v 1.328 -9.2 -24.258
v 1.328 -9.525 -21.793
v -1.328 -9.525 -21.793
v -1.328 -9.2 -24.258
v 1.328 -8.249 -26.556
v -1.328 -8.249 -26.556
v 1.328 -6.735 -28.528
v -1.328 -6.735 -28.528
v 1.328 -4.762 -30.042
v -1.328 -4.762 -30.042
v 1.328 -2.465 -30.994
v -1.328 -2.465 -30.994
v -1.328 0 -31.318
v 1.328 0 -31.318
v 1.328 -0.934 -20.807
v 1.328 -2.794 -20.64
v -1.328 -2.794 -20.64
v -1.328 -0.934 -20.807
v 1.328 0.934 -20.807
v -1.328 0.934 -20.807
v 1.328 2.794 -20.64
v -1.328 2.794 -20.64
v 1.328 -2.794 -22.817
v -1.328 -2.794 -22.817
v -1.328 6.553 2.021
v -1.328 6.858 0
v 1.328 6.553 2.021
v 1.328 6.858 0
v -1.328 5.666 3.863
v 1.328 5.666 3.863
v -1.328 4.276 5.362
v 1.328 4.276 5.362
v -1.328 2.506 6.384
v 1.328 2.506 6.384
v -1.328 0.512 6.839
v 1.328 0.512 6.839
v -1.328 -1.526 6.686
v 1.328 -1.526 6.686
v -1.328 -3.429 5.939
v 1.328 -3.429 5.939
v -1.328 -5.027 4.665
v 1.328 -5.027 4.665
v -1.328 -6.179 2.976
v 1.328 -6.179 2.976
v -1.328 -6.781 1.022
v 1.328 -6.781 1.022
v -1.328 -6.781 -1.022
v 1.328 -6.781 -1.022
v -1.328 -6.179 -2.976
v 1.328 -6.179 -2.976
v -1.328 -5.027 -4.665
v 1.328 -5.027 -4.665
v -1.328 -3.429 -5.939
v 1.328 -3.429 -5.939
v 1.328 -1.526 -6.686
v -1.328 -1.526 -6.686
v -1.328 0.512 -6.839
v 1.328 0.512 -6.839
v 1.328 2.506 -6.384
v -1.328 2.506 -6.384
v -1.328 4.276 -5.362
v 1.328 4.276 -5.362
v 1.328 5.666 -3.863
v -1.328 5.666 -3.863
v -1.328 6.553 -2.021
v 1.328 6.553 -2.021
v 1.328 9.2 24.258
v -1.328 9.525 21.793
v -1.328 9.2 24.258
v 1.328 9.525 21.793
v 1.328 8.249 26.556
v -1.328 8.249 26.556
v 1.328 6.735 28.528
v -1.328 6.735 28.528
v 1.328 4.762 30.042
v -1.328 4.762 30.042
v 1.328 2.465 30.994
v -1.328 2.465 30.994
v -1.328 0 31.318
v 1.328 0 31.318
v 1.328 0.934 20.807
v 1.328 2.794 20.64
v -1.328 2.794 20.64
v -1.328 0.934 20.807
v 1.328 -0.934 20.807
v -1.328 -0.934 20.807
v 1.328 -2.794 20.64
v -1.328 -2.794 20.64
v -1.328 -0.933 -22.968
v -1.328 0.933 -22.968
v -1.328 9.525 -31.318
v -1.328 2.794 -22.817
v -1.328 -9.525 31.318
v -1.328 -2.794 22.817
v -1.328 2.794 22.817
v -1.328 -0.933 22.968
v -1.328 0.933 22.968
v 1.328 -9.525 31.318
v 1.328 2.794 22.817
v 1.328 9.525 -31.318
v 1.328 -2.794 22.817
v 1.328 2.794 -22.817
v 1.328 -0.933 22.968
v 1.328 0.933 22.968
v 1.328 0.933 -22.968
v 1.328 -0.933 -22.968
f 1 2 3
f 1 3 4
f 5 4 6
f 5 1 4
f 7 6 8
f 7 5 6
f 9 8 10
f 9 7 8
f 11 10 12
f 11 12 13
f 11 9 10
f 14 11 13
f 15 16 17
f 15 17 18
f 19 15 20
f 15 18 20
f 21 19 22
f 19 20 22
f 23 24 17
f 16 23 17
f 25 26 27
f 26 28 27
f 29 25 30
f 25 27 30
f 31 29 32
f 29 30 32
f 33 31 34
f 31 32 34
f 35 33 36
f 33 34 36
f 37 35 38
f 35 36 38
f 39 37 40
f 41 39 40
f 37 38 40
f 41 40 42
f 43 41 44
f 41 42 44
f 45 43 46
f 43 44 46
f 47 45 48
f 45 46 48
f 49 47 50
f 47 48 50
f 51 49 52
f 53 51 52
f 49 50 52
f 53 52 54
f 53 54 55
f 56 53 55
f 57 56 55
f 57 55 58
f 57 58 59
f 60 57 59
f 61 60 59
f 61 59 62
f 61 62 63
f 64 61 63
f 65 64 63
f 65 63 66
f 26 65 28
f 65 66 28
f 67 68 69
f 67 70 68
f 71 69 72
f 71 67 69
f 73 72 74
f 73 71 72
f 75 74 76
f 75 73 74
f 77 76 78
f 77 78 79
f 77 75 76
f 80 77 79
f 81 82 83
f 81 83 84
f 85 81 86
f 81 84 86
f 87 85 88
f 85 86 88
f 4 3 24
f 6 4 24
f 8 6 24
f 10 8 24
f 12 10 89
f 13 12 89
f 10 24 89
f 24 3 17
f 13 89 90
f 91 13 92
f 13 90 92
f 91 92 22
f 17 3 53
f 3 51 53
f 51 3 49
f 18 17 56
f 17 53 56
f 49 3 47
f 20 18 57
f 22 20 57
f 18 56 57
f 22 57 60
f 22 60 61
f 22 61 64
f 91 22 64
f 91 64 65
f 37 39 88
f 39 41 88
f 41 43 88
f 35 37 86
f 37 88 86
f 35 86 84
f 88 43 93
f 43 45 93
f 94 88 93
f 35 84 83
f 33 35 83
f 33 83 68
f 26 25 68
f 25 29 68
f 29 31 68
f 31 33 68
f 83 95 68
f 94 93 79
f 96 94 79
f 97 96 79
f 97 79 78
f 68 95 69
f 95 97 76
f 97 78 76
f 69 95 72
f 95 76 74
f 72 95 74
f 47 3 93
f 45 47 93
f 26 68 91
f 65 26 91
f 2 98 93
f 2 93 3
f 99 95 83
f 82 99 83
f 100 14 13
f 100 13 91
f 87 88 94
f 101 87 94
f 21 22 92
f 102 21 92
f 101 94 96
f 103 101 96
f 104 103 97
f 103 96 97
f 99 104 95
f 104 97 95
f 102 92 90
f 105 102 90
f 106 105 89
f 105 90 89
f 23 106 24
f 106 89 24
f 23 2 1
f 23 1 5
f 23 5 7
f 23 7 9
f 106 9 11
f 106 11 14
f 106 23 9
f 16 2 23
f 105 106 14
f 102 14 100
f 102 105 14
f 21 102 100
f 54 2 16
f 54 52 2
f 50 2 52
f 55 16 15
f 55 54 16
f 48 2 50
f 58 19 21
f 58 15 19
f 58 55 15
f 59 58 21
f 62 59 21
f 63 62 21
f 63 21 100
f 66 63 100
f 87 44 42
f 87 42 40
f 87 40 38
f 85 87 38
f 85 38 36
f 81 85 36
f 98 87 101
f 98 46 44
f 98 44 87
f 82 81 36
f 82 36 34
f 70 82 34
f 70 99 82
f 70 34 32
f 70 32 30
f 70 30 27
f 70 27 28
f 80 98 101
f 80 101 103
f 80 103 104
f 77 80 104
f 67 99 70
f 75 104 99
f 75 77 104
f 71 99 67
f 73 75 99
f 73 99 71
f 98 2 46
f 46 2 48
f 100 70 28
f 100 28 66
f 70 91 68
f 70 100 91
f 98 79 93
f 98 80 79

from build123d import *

# Parameters (mm, degrees)
F1_DEPTH      = 1.32842
F2_R          = 6.858
F3_DEPTH      = 1.32942
F3_DEPTH_BACK = 1.32942
F5_DEPTH      = 2.65784


with BuildPart() as f1:
    # F0 (on Right) → F1 (new body, symmetric)
    with BuildSketch(Plane.YZ):
        with BuildLine():
            Line((0, 31.3182), (-9.525, 31.3182))
            Line((-9.525, 31.3182), (-9.525, -21.7932))
            ThreePointArc((-9.525, -21.7932), (-6.7351920908, -28.5283920908), (0, -31.3182))
            Line((0, -31.3182), (9.525, -31.3182))
            Line((9.525, -31.3182), (9.525, 21.7932))
            ThreePointArc((9.525, 21.7932), (6.7351920908, 28.5283920908), (0, 31.3182))
        make_face()
    extrude(amount=F1_DEPTH, both=True)

    # F2 (on Right) → F3 (cut, two sides)
    with BuildSketch(Plane.YZ) as f3_sk:
        Circle(F2_R)
    extrude(amount=-F3_DEPTH, mode=Mode.SUBTRACT)
    extrude(f3_sk.sketch, amount=F3_DEPTH_BACK, mode=Mode.SUBTRACT)

    # F4 (on face) → F5 (cut, through all)
    with BuildSketch(Plane(origin=(-1.32842, 0, 0), x_dir=(0, -1, 0), z_dir=(-1, 0, 0))):
        with BuildLine():
            Line((2.794, 20.6397468008), (2.794, 22.8165670731))
            ThreePointArc((2.794, 22.8165670731), (0, 22.987), (-2.794, 22.8165670731))
            Line((-2.794, 22.8165670731), (-2.794, 20.6397468008))
            ThreePointArc((-2.794, 20.6397468008), (0, 20.828), (2.794, 20.6397468008))
        make_face()
        with BuildLine():
            Line((-2.794, -20.6397468008), (-2.794, -22.8165670731))
            ThreePointArc((-2.794, -22.8165670731), (0, -22.987), (2.794, -22.8165670731))
            Line((2.794, -22.8165670731), (2.794, -20.6397468008))
            ThreePointArc((2.794, -20.6397468008), (0, -20.828), (-2.794, -20.6397468008))
        make_face()
    extrude(amount=-F5_DEPTH, mode=Mode.SUBTRACT)


solid = f1.part
